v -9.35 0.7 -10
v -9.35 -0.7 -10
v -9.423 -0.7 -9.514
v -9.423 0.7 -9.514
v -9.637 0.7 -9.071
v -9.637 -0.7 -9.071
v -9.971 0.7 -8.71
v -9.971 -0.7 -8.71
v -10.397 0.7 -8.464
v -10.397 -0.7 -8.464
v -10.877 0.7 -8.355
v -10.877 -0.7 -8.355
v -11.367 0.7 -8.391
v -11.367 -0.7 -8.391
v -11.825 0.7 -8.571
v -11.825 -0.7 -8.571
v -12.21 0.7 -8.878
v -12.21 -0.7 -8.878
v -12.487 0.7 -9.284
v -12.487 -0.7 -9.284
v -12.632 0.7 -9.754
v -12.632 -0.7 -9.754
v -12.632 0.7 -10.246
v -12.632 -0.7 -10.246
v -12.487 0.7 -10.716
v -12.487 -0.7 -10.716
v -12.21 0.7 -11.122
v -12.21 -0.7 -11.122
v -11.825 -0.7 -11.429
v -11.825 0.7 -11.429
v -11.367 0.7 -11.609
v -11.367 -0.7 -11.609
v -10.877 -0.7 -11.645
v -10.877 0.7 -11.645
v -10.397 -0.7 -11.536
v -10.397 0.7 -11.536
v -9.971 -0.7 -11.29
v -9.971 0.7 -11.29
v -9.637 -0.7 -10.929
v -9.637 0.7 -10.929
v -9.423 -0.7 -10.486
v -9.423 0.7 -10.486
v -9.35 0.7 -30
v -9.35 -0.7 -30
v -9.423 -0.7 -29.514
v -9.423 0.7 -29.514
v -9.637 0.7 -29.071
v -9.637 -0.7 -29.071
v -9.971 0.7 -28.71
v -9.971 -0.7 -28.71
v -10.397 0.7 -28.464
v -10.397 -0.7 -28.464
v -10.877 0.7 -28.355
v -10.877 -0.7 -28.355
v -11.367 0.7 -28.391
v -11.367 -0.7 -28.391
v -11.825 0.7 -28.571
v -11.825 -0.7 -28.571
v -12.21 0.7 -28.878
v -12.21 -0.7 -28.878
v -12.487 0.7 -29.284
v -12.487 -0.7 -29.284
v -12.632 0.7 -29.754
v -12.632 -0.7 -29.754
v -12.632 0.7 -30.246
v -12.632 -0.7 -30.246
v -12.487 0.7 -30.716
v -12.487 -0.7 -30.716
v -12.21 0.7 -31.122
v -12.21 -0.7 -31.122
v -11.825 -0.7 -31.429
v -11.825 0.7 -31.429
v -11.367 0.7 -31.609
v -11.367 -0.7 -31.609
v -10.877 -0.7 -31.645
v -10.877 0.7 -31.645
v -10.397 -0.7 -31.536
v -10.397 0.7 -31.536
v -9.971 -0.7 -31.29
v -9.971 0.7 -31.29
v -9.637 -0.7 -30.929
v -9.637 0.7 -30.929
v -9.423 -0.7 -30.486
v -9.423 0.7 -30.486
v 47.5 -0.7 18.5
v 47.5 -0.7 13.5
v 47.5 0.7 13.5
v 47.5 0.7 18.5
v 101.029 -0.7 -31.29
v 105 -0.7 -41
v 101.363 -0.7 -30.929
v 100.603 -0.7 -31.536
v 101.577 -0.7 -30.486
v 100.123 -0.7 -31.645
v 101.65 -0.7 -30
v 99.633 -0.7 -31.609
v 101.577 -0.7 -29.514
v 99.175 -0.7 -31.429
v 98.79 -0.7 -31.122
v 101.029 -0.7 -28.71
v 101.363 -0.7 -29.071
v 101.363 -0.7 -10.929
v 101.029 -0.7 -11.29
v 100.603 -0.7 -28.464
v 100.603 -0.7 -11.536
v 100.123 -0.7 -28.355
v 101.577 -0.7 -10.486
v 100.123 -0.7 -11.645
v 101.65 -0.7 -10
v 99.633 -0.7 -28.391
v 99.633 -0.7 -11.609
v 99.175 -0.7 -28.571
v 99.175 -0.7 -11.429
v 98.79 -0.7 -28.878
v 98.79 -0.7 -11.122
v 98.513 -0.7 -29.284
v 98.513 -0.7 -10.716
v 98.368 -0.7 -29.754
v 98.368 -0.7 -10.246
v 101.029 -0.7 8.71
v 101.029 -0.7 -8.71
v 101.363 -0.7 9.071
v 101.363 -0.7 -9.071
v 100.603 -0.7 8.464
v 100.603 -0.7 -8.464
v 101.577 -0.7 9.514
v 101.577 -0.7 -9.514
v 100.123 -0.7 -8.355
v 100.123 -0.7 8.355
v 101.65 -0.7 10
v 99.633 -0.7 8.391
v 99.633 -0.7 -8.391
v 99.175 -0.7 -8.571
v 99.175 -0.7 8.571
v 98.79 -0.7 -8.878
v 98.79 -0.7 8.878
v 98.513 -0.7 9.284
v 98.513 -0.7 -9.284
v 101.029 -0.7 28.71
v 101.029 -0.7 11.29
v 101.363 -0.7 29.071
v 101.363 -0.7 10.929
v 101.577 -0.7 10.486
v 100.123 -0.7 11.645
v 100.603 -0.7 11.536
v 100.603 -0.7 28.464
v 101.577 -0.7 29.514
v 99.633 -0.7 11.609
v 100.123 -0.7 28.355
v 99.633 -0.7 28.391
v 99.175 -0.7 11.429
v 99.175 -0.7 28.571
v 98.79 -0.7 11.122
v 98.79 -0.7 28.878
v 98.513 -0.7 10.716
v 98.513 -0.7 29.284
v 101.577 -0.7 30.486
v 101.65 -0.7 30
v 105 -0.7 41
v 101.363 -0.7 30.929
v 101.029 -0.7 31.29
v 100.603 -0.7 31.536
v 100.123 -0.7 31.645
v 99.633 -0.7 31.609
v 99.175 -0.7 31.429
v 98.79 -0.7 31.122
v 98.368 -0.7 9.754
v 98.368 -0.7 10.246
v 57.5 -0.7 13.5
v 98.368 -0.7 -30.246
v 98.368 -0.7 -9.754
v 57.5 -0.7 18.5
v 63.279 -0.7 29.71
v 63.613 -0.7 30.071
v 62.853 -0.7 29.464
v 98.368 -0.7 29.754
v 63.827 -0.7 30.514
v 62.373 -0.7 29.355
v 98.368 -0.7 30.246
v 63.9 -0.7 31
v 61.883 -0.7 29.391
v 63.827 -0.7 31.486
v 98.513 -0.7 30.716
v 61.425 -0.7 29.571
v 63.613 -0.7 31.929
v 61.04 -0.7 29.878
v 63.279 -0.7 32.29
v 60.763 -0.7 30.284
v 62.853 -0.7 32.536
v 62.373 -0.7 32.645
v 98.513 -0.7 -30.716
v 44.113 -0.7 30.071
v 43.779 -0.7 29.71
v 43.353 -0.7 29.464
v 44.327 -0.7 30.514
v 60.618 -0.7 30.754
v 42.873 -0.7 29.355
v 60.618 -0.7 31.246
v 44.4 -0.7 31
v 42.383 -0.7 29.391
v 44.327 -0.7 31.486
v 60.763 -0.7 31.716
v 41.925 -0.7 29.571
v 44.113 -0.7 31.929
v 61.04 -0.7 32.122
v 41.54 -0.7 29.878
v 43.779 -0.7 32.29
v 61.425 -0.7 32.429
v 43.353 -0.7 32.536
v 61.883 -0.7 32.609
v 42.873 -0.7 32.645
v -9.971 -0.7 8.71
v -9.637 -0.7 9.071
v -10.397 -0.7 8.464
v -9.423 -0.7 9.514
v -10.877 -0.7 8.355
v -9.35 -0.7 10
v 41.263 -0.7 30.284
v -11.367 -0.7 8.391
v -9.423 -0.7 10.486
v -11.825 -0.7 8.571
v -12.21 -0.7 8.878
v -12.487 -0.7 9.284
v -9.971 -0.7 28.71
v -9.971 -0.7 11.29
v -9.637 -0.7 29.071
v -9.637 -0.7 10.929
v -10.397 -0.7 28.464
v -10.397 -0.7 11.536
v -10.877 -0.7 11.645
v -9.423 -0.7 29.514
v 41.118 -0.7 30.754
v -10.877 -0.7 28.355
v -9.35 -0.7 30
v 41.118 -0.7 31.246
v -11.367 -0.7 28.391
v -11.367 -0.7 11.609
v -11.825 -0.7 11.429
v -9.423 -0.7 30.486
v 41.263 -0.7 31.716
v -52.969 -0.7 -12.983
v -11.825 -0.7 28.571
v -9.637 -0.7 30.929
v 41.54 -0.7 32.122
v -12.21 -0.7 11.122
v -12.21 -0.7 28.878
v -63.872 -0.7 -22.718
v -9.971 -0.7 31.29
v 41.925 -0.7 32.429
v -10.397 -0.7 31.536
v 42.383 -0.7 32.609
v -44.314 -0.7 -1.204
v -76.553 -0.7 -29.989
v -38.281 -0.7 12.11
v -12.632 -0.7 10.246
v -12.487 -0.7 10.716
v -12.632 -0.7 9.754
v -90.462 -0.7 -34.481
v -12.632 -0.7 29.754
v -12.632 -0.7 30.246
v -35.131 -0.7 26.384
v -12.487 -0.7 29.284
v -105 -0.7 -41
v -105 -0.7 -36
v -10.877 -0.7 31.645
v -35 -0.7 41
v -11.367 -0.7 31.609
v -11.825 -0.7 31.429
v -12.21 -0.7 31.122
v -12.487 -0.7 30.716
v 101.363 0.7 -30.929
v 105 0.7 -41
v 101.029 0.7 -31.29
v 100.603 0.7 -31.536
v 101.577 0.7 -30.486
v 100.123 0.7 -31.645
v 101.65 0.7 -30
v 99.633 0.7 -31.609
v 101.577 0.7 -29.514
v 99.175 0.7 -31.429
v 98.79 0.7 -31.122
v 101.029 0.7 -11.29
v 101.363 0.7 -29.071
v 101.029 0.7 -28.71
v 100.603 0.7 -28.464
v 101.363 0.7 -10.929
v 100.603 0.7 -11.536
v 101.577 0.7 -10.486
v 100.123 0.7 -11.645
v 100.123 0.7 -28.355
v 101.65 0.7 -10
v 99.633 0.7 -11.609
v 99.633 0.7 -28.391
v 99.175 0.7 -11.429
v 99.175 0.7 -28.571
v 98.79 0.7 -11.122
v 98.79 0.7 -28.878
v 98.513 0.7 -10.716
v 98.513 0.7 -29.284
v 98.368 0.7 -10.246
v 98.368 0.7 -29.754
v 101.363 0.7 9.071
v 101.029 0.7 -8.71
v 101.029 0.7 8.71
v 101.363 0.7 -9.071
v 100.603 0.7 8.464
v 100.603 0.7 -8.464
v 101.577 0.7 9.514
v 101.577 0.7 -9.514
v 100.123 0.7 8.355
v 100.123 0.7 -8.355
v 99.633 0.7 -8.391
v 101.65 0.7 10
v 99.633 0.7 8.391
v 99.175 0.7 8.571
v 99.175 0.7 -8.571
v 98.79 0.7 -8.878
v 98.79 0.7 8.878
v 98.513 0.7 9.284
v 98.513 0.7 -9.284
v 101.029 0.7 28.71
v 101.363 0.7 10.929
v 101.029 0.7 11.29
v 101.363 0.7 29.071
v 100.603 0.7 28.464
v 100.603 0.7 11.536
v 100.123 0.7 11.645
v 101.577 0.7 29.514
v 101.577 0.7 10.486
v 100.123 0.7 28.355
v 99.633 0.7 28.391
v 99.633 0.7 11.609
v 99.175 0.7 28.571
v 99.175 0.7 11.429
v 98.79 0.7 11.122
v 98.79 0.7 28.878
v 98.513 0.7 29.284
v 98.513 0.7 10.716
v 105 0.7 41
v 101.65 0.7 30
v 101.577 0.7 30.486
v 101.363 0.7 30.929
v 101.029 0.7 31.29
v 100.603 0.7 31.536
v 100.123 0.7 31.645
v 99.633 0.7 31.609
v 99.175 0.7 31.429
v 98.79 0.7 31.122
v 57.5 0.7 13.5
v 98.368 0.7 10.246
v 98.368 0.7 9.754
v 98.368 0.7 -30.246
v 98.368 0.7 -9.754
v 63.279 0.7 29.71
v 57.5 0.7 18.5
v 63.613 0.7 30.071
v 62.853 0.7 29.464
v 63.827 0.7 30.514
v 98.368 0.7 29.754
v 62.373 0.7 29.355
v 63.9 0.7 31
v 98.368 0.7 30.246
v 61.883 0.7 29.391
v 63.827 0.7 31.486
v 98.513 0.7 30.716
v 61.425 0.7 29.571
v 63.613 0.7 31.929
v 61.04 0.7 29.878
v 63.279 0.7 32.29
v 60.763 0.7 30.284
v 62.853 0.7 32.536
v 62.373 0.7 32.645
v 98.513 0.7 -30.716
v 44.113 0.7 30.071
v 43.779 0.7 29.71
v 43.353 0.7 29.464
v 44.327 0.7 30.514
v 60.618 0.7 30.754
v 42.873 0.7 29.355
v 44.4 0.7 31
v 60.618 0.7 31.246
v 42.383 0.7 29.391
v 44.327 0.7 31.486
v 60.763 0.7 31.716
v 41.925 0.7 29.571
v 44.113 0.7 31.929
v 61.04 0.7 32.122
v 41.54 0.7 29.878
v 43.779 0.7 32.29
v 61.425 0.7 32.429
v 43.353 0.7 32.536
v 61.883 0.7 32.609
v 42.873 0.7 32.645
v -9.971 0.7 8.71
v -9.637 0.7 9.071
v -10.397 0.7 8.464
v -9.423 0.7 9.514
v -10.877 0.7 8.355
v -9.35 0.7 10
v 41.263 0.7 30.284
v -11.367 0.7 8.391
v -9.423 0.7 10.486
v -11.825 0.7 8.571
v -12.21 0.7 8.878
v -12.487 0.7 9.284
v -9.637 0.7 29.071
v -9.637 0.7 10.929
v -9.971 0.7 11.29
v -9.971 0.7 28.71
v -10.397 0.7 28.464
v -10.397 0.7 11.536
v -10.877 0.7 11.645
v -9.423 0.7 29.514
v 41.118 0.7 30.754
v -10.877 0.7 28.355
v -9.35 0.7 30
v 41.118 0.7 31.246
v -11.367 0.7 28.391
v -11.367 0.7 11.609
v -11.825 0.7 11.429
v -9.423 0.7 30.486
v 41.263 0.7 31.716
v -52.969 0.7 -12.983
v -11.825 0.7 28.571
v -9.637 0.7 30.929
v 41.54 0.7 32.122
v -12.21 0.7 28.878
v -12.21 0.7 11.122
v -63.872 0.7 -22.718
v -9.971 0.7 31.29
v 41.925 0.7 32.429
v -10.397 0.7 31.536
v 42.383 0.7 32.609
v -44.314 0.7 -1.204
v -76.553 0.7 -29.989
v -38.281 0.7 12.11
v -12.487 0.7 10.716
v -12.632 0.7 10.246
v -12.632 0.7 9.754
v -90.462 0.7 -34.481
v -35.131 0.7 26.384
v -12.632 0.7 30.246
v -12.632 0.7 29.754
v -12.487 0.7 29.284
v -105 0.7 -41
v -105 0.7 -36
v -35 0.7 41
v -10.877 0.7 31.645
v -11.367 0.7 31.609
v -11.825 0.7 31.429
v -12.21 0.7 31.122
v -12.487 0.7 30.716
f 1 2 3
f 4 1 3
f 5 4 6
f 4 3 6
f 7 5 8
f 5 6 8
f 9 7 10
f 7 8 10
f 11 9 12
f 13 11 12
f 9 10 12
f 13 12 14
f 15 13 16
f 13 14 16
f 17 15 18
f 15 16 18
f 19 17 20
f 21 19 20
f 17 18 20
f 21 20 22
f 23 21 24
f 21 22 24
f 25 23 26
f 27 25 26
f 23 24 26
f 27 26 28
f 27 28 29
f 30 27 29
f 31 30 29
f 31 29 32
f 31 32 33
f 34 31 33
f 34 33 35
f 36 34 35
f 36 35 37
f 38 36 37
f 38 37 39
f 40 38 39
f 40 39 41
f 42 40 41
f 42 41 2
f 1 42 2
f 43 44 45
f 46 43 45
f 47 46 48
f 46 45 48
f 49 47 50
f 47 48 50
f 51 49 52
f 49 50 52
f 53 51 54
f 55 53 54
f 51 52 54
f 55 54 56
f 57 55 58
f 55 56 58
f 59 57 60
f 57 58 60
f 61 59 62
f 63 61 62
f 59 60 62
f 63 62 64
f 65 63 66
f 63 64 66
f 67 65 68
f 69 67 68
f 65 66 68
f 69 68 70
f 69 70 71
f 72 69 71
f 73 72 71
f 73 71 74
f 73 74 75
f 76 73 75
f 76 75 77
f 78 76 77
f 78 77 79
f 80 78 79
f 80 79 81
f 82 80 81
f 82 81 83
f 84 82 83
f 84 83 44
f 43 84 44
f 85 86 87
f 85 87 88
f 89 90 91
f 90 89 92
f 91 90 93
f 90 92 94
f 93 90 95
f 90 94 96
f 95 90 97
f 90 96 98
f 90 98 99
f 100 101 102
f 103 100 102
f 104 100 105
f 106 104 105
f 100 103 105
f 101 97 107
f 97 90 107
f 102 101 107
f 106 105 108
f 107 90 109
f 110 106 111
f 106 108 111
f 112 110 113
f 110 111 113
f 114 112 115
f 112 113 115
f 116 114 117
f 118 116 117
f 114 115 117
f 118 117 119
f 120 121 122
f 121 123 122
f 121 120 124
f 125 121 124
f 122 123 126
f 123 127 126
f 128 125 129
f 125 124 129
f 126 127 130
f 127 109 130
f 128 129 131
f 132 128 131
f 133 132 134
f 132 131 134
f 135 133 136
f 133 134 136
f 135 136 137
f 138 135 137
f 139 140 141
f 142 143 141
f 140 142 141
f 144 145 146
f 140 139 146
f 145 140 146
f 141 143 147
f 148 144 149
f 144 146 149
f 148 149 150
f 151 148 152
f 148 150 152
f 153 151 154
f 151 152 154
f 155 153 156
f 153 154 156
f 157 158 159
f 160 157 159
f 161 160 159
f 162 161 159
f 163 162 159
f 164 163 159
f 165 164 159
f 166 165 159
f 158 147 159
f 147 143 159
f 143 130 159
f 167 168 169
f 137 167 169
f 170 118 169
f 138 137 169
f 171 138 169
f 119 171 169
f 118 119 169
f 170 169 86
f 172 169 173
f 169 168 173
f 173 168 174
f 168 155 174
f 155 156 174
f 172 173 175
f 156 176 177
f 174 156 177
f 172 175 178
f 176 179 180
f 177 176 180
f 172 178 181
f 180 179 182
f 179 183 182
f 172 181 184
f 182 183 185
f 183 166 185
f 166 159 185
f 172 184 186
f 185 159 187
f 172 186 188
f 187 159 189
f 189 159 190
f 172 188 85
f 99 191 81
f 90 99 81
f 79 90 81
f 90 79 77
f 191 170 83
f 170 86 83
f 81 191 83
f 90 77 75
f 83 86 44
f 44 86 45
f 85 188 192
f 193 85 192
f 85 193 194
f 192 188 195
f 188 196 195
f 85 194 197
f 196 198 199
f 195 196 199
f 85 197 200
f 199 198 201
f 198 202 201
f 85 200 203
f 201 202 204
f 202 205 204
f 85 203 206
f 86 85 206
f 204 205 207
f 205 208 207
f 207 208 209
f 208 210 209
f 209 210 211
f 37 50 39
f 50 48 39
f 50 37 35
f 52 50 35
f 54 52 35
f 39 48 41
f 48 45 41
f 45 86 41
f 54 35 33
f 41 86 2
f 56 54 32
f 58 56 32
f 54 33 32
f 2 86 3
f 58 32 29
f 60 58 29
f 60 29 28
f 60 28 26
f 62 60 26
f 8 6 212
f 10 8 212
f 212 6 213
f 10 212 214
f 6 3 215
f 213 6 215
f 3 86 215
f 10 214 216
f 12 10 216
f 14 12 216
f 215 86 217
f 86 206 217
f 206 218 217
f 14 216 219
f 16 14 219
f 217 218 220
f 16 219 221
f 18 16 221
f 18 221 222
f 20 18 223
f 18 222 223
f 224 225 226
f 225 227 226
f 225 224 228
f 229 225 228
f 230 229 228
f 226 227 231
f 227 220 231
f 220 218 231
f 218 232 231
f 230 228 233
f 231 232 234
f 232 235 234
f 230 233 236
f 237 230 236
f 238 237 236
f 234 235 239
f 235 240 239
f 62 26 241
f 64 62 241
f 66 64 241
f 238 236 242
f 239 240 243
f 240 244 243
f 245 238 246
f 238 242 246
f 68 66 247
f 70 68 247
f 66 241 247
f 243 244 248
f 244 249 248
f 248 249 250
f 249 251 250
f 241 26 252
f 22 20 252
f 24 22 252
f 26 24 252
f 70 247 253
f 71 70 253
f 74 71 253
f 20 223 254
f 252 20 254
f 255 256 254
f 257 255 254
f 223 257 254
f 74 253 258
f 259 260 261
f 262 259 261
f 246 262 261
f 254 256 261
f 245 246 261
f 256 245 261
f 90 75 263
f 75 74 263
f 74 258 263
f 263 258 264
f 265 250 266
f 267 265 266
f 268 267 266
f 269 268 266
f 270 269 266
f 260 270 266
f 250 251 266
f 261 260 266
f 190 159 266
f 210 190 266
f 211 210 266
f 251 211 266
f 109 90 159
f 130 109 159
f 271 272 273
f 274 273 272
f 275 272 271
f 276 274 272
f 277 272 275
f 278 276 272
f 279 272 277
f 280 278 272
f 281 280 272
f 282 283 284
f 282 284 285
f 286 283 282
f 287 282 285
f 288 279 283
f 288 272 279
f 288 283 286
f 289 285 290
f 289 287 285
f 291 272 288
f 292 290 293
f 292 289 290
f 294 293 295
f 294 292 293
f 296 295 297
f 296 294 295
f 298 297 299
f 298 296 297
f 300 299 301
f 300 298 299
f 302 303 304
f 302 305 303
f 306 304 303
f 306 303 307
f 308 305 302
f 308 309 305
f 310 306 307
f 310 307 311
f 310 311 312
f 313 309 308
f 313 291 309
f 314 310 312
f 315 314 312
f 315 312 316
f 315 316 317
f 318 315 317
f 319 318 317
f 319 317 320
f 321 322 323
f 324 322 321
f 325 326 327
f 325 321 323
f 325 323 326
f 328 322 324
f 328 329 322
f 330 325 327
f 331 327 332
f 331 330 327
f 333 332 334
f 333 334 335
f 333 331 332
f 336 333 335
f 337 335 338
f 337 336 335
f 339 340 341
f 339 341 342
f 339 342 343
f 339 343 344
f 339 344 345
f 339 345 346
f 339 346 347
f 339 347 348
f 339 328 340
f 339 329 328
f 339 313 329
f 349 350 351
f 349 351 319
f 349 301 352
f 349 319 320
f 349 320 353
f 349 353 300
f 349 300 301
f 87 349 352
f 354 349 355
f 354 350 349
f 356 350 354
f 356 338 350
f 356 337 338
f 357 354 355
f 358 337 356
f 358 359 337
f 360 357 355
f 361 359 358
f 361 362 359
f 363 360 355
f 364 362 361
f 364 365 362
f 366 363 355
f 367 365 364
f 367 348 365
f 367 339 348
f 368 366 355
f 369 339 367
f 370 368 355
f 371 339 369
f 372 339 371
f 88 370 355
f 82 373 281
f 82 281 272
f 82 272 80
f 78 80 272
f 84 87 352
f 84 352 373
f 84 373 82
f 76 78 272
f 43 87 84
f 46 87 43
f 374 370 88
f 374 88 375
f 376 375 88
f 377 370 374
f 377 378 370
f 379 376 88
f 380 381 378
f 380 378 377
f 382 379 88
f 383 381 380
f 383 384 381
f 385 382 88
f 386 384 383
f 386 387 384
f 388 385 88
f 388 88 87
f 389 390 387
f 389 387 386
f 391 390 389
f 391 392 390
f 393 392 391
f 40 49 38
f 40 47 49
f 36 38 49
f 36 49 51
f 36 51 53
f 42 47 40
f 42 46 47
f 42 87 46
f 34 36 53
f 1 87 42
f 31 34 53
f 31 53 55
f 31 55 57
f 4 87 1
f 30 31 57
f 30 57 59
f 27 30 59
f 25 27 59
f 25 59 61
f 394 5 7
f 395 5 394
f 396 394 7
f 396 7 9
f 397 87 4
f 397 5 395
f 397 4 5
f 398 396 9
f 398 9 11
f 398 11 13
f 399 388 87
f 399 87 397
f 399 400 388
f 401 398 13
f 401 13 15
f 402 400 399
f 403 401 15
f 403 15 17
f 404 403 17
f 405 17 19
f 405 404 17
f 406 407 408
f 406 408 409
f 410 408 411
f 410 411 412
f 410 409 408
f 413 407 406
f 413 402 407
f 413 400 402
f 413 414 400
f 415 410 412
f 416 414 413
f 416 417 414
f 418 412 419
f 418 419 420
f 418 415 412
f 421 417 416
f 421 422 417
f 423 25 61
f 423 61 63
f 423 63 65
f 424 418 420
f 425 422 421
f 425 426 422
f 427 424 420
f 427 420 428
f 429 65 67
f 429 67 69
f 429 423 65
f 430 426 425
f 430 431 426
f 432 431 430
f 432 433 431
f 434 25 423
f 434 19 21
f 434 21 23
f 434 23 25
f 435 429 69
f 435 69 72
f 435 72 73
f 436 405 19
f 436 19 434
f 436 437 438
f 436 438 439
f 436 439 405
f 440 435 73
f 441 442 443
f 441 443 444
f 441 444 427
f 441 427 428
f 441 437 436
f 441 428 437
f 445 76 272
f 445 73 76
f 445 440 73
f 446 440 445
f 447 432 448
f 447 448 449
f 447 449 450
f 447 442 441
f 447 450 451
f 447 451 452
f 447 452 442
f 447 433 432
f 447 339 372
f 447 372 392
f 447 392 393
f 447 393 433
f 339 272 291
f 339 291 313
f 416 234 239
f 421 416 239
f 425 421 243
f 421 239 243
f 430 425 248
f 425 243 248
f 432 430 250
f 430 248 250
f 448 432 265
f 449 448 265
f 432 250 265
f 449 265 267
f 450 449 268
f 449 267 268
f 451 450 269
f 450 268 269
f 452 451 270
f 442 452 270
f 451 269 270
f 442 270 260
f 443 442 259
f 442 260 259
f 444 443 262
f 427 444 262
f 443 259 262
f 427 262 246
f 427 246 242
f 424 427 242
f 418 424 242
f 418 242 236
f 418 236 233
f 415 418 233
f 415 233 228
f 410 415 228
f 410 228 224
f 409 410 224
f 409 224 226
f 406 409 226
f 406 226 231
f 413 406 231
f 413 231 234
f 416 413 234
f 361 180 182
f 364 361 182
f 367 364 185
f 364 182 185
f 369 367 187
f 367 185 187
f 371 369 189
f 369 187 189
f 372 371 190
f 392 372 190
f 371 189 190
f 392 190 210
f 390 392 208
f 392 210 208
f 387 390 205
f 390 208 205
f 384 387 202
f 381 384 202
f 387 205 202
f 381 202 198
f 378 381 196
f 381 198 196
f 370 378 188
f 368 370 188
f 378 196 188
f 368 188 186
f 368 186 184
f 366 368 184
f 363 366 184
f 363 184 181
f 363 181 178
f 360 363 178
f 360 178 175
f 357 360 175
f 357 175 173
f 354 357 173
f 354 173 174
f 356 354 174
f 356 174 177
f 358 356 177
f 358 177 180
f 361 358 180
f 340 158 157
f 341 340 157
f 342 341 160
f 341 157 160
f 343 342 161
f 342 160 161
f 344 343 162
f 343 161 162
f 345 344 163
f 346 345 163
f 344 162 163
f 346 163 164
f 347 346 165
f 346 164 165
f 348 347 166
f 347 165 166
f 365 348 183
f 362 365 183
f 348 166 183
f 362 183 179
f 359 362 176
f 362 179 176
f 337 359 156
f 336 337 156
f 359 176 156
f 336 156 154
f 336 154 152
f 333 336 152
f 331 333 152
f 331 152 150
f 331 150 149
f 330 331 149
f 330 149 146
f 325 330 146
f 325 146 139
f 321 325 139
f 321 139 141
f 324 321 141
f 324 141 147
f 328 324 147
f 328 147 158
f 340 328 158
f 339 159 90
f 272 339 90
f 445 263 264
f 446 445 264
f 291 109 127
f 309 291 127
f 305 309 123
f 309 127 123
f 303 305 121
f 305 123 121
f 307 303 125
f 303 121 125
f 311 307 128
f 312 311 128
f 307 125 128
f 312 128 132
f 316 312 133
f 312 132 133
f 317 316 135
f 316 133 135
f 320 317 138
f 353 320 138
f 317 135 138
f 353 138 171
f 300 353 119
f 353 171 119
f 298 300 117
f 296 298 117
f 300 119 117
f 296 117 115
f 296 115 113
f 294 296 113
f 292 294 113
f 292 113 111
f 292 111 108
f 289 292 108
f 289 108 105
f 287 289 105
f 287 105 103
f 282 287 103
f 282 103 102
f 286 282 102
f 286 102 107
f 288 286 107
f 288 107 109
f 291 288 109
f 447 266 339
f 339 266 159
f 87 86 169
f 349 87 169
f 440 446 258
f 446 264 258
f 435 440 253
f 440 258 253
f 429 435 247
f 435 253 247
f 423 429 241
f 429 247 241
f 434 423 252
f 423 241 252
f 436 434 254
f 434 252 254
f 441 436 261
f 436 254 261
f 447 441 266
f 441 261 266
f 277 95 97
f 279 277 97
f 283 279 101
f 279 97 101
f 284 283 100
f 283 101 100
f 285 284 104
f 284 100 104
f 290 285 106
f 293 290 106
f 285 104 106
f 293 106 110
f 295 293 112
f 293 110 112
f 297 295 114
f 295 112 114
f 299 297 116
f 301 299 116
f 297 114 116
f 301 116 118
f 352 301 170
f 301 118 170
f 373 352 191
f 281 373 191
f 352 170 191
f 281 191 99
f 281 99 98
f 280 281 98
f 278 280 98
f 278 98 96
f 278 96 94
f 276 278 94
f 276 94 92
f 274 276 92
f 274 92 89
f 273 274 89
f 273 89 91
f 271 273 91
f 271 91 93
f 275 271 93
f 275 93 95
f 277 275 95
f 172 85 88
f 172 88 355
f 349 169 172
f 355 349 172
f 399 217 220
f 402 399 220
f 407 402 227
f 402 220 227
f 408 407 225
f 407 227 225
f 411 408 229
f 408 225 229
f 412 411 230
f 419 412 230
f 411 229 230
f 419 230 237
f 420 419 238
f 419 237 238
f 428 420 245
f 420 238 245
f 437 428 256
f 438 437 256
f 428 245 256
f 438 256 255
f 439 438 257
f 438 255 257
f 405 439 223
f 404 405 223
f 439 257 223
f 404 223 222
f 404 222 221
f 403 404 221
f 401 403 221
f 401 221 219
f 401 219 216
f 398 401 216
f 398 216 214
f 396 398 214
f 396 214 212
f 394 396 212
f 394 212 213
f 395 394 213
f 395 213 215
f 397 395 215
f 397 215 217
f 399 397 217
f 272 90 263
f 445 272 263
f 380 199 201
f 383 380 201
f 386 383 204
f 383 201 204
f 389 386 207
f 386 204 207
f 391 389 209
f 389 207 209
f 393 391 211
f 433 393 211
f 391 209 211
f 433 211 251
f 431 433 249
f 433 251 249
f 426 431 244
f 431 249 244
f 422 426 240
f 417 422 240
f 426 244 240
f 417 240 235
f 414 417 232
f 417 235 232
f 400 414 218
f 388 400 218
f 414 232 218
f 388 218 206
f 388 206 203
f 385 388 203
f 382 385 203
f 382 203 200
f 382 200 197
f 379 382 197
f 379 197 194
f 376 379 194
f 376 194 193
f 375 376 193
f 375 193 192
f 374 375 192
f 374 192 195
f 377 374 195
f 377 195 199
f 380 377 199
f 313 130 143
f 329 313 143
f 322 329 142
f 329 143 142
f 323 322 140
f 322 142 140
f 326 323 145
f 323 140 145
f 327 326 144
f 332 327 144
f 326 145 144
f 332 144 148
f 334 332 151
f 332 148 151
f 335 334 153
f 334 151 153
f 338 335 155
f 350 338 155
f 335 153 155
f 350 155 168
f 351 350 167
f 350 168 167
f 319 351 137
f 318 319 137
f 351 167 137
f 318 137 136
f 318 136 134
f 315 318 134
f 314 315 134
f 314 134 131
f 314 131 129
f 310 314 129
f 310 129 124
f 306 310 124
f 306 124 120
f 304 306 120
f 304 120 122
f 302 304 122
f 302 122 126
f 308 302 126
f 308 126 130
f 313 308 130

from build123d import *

# Parameters (mm, degrees)
PAD_DEPTH       = 0.7
PAD_DEPTH_BACK  = 0.7
SKETCH001_R     = 1.65
POCKET_DEPTH    = 1.401
SKETCH002_R     = 1.65
SKETCH002_W     = 10
SKETCH002_H     = 5
POCKET001_DEPTH = 1.401


with BuildPart() as part:
    # Sketch → Pad (new body, two sides)
    with BuildSketch(Plane.XZ) as pad_sk:
        with BuildLine():
            Line((-105, -41), (-105, -36))
            ThreePointArc((-105, -36), (-52.968759, -12.982946), (-35, 41))
            Line((-35, 41), (105, 41))
            Line((105, 41), (105, -41))
            Line((105, -41), (-105, -41))
        make_face()
    extrude(amount=PAD_DEPTH)
    extrude(pad_sk.sketch, amount=-PAD_DEPTH_BACK)

    # Sketch001 (on Face7 of Pad) → Pocket (cut, through all)
    with BuildSketch(Plane.XZ.offset(0.7)):
        with Locations((100, 30)):
            Circle(SKETCH001_R)
        with Locations((100, 10)):
            Circle(SKETCH001_R)
        with Locations((-11, 30)):
            Circle(SKETCH001_R)
        with Locations((-11, 10)):
            Circle(SKETCH001_R)
        with Locations((100, -30)):
            Circle(SKETCH001_R)
        with Locations((100, -10)):
            Circle(SKETCH001_R)
        with Locations((-11, -30)):
            Circle(SKETCH001_R)
        with Locations((-11, -10)):
            Circle(SKETCH001_R)
    extrude(amount=-POCKET_DEPTH, mode=Mode.SUBTRACT)

    # Sketch002 (on Face5 of Pocket) → Pocket001 (cut, through all)
    with BuildSketch(Plane.XZ.offset(0.7)):
        with Locations((42.75, 31)):
            Circle(SKETCH002_R)
        with Locations((62.25, 31)):
            Circle(SKETCH002_R)
        with Locations((52.5, 16)):
            Rectangle(SKETCH002_W, SKETCH002_H)
    extrude(amount=-POCKET001_DEPTH, mode=Mode.SUBTRACT)


solid = part.part
